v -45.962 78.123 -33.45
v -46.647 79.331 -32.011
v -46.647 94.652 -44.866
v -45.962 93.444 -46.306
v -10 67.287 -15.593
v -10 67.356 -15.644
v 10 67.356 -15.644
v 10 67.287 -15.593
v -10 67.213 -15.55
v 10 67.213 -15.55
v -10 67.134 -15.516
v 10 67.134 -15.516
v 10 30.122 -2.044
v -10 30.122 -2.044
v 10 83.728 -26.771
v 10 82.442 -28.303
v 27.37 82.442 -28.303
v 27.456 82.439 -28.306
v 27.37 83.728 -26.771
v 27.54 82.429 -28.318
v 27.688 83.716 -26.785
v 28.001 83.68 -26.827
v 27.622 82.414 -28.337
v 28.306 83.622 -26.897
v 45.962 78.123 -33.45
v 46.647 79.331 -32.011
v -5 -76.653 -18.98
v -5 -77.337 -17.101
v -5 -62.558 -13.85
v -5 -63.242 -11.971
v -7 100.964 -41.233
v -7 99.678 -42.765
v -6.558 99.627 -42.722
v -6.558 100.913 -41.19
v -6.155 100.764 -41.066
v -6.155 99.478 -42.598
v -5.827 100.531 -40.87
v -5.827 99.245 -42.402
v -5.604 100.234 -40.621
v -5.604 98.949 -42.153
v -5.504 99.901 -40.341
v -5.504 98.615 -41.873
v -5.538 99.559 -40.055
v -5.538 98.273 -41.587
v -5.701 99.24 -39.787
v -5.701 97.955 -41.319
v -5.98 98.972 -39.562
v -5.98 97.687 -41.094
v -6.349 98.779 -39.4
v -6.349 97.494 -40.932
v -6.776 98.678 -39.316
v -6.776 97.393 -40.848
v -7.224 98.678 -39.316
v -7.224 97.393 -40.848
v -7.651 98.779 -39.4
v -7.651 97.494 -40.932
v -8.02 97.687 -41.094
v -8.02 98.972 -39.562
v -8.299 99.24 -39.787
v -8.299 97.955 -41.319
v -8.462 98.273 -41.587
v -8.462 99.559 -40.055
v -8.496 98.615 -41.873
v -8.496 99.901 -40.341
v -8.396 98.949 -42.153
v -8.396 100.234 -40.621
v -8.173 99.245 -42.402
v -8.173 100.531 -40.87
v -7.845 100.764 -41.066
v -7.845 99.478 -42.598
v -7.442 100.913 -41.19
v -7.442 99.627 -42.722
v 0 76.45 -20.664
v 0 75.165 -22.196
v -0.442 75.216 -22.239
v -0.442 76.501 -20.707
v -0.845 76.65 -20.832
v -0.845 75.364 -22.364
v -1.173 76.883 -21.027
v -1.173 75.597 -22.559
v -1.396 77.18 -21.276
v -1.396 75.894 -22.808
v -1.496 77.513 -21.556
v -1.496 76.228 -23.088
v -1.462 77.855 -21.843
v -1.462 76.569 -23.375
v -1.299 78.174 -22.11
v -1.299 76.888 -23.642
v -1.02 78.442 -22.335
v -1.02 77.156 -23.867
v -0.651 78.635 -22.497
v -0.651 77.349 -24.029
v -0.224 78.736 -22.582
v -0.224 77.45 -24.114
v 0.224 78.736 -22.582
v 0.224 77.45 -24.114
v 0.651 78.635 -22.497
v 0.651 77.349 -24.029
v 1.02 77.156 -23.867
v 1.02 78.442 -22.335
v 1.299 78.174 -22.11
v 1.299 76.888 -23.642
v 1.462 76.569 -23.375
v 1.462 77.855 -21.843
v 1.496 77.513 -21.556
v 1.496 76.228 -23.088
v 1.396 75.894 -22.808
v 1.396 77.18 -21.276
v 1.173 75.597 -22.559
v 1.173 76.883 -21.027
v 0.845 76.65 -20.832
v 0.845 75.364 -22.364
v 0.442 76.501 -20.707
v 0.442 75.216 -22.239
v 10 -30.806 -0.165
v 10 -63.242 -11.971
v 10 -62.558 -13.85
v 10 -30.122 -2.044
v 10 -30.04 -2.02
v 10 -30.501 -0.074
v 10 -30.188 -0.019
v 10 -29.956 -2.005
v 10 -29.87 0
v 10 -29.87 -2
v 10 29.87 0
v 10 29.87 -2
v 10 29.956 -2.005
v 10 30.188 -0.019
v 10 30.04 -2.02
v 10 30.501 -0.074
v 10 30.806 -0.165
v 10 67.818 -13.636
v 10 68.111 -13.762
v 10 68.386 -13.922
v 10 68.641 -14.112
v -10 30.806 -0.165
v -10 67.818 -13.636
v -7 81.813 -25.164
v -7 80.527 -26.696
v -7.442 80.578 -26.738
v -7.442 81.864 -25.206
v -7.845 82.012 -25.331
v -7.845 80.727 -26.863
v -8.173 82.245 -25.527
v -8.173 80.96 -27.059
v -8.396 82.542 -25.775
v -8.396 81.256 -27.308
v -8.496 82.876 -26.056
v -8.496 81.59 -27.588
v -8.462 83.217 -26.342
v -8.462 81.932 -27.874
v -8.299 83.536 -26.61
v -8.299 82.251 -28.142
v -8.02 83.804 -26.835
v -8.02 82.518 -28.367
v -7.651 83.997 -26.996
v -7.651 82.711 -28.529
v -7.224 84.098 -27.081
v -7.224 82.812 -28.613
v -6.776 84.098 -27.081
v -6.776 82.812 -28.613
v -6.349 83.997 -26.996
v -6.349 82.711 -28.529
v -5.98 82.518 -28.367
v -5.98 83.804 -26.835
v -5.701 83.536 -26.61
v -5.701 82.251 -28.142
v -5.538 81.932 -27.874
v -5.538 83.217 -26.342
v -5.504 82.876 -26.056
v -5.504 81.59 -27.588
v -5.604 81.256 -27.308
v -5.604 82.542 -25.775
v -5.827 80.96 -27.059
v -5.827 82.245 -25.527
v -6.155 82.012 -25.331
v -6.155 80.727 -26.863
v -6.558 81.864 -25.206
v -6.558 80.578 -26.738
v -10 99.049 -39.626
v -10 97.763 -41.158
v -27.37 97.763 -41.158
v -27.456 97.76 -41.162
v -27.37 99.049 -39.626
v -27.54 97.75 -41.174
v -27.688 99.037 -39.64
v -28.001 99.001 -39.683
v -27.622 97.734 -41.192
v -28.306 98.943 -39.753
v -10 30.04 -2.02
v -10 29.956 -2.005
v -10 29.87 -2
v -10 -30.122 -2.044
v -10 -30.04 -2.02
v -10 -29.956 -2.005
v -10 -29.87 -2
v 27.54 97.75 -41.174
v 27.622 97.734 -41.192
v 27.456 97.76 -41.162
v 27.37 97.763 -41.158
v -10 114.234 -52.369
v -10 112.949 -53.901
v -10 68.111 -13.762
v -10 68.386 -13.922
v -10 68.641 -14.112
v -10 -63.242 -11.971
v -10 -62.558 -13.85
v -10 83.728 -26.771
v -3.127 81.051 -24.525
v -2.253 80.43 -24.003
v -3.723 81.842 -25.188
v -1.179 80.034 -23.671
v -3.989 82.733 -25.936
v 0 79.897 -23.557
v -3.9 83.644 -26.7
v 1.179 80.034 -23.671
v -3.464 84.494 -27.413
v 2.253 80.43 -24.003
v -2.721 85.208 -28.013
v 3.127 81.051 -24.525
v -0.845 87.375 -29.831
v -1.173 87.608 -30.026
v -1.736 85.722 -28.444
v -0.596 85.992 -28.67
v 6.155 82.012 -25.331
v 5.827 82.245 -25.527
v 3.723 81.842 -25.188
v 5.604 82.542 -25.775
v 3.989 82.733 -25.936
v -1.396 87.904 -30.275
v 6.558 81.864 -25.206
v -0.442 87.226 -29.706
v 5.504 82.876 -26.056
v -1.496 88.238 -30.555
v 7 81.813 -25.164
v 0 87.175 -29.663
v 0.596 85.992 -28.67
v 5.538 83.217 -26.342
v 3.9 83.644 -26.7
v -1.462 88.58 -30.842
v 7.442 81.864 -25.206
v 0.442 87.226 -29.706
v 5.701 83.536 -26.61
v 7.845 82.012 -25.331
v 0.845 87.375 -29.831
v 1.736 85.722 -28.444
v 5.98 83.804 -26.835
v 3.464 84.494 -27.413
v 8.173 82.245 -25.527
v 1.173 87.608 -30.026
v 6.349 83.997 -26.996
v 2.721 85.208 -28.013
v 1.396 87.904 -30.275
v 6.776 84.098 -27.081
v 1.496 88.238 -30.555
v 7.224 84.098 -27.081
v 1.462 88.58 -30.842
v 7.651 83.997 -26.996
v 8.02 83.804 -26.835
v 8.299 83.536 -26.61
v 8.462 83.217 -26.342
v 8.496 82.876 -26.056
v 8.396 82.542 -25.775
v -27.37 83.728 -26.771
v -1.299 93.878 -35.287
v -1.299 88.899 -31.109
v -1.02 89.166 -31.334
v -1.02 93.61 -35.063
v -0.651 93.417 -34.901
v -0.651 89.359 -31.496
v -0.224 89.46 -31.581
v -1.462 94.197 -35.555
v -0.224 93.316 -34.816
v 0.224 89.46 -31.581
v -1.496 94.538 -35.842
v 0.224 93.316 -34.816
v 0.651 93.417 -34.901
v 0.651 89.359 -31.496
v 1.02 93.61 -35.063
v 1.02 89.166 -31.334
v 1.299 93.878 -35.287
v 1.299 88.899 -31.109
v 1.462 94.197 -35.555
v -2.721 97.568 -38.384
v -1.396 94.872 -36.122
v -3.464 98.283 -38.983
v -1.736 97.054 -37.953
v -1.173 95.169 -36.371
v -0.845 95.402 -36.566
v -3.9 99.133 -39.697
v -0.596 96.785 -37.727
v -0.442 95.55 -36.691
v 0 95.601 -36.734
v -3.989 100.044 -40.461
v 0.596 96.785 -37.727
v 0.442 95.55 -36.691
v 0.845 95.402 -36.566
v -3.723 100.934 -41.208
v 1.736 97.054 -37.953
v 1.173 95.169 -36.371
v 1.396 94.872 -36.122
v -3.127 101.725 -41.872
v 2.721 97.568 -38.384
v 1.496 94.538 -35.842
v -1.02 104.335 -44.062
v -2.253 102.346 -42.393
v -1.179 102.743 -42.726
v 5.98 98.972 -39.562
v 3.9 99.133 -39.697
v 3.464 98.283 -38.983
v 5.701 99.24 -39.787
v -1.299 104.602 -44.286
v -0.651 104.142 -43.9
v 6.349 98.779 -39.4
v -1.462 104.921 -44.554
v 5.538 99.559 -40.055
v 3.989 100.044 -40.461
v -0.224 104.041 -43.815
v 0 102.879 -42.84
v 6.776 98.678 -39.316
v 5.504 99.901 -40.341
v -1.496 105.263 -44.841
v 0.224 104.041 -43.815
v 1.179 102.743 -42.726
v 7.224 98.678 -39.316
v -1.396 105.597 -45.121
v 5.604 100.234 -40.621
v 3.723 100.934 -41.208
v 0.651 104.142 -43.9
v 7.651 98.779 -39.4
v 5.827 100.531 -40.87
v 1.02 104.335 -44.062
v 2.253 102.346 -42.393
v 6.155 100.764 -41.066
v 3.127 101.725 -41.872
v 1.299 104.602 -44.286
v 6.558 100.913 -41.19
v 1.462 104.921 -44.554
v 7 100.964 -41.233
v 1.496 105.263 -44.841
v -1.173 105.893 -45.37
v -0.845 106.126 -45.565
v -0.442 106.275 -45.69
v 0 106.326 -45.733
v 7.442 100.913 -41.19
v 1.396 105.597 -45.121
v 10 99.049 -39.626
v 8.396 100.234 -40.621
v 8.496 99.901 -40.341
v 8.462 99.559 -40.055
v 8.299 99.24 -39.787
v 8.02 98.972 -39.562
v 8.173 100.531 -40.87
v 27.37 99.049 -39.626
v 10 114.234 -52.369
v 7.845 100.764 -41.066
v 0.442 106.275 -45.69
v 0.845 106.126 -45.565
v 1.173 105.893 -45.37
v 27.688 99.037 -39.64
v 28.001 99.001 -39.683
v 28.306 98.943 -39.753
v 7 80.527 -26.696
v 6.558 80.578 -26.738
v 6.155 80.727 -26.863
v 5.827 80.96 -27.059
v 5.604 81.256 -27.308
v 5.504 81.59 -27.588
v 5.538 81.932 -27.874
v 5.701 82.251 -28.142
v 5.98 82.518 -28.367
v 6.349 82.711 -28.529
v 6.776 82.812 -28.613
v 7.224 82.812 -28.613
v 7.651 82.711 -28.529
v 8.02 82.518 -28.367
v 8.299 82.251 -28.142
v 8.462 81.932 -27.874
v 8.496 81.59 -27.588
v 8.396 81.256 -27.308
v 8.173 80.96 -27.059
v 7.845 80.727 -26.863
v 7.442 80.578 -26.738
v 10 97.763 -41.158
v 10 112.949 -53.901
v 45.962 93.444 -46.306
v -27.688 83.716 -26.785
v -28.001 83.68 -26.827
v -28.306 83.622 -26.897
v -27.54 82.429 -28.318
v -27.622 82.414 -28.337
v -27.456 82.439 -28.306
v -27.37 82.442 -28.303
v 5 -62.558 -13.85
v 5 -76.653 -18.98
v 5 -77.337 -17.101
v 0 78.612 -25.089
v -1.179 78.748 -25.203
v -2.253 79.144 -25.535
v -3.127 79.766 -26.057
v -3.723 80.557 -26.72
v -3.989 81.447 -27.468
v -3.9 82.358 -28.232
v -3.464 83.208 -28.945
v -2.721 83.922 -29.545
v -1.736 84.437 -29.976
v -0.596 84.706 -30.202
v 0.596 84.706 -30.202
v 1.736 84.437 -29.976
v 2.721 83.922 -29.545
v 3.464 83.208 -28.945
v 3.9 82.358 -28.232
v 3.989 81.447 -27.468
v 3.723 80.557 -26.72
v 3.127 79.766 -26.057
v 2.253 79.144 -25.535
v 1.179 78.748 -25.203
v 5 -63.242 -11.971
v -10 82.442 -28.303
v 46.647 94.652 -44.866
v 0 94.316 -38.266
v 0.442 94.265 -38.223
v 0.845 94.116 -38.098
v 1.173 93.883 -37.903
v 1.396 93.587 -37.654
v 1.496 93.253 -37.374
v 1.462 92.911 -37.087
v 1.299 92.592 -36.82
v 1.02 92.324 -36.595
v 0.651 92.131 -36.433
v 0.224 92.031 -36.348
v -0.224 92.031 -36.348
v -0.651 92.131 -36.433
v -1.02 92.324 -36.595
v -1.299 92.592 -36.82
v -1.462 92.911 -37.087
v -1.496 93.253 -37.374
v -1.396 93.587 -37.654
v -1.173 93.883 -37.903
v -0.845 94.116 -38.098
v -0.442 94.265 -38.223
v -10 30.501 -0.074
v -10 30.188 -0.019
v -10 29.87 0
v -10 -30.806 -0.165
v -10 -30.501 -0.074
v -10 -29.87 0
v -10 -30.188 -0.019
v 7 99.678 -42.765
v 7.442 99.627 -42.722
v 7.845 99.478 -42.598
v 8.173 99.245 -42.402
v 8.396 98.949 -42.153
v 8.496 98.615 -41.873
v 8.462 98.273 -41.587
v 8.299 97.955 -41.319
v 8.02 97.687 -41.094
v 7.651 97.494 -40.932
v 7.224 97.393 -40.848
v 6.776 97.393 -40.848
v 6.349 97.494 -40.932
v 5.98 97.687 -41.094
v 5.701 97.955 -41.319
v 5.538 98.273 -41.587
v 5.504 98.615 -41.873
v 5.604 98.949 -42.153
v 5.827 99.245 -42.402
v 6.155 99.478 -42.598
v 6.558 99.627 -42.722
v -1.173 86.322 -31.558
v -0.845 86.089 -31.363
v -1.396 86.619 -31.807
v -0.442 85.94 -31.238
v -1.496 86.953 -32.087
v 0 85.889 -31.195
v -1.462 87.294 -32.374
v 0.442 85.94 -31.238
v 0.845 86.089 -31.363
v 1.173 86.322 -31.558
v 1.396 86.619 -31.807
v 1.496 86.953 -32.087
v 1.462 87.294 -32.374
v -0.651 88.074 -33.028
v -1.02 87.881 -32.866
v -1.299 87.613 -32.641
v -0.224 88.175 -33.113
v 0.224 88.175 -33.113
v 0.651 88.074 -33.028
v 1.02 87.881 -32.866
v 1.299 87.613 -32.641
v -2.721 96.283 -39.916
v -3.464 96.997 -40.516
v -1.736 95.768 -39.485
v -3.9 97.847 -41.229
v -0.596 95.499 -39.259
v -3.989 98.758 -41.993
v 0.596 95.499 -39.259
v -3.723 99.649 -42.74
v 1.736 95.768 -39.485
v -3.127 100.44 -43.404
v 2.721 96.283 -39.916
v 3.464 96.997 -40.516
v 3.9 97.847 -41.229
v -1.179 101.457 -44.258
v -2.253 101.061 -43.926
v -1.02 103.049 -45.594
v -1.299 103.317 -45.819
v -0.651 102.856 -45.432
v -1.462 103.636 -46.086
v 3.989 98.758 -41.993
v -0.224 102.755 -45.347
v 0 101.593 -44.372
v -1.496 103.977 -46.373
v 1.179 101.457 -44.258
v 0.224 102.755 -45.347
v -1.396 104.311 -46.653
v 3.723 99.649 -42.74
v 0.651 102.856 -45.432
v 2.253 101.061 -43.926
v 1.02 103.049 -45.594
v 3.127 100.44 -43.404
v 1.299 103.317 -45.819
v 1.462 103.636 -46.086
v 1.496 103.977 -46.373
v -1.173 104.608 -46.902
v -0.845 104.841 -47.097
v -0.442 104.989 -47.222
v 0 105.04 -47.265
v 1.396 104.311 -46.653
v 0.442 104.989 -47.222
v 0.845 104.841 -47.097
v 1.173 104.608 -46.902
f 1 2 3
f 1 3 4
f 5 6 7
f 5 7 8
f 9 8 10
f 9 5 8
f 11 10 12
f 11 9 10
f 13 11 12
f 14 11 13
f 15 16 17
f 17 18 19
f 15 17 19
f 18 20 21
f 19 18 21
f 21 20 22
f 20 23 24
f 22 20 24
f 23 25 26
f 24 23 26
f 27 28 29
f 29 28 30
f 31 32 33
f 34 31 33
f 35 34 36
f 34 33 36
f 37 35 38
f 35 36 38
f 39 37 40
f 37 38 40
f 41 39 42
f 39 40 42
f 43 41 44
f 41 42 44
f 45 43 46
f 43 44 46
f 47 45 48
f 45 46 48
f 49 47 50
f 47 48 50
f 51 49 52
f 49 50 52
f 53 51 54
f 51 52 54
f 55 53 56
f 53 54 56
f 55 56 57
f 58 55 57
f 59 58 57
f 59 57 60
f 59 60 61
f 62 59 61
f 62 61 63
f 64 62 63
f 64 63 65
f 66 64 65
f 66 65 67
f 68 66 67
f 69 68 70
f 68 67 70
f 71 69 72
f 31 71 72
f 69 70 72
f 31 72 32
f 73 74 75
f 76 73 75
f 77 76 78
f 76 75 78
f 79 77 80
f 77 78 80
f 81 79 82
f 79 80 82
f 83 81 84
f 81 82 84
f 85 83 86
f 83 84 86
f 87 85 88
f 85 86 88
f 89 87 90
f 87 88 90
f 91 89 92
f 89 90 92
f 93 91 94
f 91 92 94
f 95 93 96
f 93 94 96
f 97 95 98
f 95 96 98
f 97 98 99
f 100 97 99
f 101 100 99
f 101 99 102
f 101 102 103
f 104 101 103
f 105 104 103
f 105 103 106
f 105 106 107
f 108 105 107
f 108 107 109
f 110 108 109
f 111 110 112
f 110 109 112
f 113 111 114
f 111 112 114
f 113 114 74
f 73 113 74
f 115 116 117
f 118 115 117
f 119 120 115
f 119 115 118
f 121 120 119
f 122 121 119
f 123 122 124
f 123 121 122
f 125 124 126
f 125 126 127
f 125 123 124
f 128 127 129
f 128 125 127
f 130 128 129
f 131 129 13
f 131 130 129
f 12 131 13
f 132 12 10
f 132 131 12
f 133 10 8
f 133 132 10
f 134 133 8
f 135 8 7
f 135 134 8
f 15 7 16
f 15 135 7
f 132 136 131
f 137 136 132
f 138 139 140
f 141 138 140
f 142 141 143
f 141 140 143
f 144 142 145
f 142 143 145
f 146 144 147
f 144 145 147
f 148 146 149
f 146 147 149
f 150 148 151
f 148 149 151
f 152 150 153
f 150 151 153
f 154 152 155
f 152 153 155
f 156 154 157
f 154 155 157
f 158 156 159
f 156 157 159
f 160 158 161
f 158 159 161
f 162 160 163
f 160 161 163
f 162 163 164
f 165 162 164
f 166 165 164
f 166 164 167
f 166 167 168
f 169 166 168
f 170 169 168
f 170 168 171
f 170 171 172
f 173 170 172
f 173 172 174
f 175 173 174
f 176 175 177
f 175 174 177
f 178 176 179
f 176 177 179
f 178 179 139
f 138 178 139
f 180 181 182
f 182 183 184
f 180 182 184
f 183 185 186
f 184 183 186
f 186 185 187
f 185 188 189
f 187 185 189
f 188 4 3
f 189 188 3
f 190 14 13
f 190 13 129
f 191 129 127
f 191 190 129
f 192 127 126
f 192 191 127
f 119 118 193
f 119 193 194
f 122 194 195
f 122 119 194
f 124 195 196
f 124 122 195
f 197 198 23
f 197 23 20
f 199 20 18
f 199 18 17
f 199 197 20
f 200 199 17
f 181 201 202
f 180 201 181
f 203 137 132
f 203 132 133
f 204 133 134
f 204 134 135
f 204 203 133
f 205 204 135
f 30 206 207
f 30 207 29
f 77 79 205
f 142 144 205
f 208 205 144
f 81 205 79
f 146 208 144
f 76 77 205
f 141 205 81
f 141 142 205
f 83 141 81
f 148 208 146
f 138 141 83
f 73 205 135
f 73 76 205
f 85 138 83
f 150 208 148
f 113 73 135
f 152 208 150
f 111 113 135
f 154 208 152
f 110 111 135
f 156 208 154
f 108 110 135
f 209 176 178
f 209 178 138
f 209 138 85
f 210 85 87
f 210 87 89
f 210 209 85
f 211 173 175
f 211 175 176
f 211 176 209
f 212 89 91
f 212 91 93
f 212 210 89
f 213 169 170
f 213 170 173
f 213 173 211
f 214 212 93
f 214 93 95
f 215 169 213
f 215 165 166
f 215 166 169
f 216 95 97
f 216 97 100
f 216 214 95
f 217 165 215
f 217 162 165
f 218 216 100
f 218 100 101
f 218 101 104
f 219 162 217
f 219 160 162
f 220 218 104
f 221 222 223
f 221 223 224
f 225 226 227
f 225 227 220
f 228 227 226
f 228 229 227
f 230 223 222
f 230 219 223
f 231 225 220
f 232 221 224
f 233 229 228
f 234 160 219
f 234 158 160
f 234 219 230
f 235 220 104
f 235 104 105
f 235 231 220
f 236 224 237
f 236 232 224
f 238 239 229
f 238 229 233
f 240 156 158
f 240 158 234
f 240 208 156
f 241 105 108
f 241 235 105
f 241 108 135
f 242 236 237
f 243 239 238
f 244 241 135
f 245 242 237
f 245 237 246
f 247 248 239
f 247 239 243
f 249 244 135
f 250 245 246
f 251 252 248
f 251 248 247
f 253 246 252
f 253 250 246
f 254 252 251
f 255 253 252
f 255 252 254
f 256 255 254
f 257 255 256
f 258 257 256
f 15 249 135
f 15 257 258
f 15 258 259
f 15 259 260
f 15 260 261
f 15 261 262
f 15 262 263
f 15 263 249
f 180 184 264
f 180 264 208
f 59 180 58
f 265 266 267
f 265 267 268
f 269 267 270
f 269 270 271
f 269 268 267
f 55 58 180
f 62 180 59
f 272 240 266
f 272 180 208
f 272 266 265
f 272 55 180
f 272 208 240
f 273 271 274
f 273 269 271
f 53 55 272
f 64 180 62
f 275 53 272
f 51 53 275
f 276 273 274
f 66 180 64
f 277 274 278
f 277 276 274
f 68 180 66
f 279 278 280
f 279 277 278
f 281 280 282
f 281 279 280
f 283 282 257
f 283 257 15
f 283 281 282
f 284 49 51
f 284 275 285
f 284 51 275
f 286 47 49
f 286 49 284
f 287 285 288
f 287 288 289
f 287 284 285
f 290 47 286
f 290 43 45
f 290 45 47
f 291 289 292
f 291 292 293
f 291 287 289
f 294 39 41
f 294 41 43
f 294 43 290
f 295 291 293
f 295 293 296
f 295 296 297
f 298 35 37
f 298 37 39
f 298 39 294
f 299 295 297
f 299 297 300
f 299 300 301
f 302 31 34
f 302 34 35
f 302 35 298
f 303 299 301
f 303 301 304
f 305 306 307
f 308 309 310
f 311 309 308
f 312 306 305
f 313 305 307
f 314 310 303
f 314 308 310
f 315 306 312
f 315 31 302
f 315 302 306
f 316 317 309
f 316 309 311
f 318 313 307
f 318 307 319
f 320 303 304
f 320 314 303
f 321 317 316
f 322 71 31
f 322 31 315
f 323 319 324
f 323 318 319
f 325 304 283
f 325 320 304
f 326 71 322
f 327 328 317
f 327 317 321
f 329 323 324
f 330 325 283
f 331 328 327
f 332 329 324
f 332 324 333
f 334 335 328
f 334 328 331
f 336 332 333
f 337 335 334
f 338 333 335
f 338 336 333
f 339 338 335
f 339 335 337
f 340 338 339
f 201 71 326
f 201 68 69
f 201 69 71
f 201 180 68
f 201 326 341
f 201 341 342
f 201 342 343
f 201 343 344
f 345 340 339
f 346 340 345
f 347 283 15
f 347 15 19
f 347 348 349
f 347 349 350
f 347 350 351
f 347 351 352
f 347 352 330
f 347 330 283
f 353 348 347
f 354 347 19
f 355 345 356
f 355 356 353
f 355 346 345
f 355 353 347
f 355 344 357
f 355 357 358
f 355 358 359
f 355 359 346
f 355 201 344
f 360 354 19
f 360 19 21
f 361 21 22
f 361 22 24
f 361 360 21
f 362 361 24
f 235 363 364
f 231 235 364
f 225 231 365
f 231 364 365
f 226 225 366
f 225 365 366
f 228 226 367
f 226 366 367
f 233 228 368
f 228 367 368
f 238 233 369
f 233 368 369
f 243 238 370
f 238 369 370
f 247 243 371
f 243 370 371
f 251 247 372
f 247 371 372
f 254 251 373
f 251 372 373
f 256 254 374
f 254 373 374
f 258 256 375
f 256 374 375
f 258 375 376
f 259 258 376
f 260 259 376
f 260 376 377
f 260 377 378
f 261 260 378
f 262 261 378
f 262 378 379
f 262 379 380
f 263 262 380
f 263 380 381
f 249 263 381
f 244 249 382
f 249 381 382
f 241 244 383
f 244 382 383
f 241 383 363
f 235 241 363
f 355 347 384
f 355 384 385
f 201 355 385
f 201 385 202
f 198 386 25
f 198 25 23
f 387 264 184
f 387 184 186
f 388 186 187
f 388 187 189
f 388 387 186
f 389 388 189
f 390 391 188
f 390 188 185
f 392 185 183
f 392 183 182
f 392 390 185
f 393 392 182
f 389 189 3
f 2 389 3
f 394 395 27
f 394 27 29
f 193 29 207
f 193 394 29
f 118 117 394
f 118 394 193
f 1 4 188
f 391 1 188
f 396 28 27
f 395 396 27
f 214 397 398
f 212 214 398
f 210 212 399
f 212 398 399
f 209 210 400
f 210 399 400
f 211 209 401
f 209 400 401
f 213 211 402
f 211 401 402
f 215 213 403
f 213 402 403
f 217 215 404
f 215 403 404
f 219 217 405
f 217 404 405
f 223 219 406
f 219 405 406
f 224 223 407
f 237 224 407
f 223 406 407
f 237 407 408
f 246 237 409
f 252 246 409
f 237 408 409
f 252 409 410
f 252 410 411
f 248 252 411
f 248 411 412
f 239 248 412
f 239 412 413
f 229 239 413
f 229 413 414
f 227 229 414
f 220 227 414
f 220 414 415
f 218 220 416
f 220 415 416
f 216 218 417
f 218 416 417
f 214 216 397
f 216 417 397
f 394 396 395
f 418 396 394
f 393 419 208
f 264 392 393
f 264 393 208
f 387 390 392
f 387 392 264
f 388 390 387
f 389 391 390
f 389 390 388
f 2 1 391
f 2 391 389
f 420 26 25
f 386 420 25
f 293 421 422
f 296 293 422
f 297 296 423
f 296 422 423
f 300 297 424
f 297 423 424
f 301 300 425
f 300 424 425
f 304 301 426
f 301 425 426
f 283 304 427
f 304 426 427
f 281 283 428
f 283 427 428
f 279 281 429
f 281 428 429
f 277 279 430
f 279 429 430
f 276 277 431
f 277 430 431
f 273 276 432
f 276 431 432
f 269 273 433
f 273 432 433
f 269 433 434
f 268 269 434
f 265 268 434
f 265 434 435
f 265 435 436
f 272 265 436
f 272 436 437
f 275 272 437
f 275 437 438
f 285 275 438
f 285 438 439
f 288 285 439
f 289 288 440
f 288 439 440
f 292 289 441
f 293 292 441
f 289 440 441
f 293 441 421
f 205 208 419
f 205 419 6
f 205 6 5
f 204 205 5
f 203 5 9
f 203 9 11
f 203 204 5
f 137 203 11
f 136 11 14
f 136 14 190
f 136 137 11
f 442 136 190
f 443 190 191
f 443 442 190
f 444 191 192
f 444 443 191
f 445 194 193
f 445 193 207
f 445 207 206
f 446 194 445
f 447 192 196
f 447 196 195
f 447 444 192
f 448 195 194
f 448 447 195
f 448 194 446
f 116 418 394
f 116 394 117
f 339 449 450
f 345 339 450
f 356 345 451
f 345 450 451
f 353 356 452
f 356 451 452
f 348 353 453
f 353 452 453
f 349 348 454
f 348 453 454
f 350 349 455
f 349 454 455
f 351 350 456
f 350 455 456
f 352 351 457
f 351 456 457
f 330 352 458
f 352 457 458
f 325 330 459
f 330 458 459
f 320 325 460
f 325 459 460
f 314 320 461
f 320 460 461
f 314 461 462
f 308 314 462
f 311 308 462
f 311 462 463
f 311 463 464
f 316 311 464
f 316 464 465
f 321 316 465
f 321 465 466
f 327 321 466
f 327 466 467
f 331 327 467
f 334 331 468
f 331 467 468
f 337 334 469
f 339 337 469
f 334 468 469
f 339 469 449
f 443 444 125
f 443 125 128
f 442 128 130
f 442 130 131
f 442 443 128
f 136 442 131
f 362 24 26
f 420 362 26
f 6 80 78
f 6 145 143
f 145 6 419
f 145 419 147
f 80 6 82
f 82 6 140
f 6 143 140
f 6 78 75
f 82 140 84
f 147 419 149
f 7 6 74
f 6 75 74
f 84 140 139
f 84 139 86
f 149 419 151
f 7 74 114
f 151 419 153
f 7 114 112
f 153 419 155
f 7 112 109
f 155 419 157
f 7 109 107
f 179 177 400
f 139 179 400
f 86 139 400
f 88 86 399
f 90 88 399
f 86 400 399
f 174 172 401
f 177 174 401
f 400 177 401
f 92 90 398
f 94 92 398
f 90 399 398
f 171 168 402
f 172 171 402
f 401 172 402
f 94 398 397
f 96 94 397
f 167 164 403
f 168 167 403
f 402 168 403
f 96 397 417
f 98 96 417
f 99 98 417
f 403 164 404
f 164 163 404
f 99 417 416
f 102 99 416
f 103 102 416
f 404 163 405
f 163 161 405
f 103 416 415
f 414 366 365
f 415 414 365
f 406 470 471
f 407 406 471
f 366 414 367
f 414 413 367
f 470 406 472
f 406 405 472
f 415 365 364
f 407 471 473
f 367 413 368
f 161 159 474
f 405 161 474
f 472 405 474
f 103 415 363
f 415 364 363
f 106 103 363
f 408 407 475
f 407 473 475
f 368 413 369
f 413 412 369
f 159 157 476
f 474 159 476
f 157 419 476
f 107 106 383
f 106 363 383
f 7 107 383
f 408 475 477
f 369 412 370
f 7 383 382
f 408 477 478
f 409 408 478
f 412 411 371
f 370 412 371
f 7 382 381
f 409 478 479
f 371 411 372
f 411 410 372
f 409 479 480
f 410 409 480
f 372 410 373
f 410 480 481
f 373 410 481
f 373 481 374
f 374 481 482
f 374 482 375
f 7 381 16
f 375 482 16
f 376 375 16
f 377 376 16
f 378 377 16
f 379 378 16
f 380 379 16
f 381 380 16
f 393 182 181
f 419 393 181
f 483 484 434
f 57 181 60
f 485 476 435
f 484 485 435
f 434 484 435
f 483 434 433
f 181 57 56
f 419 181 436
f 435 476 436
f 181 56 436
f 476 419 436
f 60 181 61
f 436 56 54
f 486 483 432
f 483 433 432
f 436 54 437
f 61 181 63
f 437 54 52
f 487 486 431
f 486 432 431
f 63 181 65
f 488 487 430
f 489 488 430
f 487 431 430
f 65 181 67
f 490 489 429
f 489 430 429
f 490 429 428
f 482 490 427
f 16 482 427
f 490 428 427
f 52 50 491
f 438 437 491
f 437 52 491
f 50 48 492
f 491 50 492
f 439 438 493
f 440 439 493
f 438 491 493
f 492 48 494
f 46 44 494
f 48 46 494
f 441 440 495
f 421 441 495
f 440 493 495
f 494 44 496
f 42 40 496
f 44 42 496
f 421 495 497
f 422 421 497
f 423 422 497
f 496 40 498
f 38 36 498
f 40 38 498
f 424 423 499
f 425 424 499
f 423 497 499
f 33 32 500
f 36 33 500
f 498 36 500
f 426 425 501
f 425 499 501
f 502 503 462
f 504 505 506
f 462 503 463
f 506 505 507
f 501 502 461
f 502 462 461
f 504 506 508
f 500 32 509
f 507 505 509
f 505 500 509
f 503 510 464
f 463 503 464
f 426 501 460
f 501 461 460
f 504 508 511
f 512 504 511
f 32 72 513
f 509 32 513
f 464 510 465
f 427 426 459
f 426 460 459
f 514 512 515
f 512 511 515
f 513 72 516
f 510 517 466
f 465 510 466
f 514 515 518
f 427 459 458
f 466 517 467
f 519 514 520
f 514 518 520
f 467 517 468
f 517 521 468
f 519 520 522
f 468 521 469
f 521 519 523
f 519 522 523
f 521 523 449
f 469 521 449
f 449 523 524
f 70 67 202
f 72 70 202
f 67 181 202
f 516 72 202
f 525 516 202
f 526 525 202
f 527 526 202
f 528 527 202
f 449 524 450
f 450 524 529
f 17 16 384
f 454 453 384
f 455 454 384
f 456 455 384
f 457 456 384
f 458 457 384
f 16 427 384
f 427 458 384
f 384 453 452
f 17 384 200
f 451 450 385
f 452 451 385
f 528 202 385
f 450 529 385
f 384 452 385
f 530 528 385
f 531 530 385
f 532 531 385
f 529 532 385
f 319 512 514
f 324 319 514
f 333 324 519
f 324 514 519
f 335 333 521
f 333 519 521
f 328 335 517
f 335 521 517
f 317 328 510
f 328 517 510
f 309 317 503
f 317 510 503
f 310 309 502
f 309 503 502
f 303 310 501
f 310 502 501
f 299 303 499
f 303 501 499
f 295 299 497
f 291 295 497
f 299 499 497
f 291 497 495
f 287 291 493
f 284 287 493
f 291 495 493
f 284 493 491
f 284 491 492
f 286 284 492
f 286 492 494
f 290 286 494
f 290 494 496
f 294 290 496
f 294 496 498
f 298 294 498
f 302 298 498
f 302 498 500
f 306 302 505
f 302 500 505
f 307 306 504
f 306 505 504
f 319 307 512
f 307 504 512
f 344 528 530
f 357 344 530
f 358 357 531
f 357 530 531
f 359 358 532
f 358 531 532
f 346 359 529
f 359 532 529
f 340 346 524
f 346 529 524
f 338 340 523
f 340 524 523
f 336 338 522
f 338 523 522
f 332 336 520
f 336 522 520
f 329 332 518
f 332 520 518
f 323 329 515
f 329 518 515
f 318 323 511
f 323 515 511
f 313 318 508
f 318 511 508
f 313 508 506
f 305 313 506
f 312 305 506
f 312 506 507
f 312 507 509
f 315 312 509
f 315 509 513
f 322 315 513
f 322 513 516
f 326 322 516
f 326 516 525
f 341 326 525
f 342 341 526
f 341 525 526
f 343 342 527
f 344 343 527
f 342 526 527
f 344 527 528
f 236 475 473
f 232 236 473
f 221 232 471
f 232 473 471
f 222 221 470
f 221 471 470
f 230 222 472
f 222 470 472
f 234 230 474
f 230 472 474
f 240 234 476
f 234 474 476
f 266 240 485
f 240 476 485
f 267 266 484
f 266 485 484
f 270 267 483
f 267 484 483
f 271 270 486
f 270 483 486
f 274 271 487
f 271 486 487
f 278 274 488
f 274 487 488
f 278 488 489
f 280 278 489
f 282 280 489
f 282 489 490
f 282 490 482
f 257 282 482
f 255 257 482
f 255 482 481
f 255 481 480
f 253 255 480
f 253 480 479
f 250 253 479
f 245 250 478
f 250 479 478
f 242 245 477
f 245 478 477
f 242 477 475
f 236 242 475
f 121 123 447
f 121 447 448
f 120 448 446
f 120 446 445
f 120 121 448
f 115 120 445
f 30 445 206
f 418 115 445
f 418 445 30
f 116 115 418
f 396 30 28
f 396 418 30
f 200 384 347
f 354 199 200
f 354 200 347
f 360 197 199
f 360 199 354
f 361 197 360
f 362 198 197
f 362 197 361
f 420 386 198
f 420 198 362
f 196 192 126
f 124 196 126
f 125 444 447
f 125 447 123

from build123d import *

# Parameters (mm, degrees)
SKETCH1_W                      = 20
SKETCH1_H                      = 60
BASE_FLANGE1_DEPTH             = 2
EDGE_FLANGE1_STRIP_CUT_DEPTH   = 20
EDGE_FLANGE1_DEPTH             = 20
EDGE_FLANGE2_STRIP_CUT_DEPTH   = 20
EDGE_FLANGE2_DEPTH             = 20
EDGE_FLANGE3_STRIP_CUT_DEPTH   = 20
EDGE_FLANGE3_DEPTH             = 20
EDGE_FLANGE3_START             = 2
EDGE_FLANGE3_FLAT_DEPTH        = 2
EDGE_FLANGE4_STRIP_CUT_DEPTH   = 20
EDGE_FLANGE4_STRIP_CUT_2_DEPTH = 20
EDGE_FLANGE4_DEPTH             = 20
EDGE_FLANGE4_BEND_DEPTH        = 20
SKETCH16_W                     = 5
SKETCH16_H                     = 15
CUT_EXTRUDE2_DEPTH             = 142.77897769
SKETCH23_R                     = 4
SKETCH23_R_2                   = 1.5
CUT_EXTRUDE3_DEPTH             = 2


# Sheet-metal steps are written as plain solids
with BuildPart() as part:
    # Sketch1 → Base-Flange1 (new body)
    with BuildSketch(Plane.XY):
        Rectangle(SKETCH1_W, SKETCH1_H)
    extrude(amount=-BASE_FLANGE1_DEPTH)

    # Edge-Flange1 strip (across the edge) → Edge-Flange1 strip cut (cut)
    with BuildSketch(Plane(origin=(-10, 30, -2), x_dir=(0, -0.3420201433256631, -0.9396926207859105), z_dir=(1, 0, 0))):
        Polygon((-5.074988048, 8.095806265), (-1.834962826, -0.80608987), (0.044422416, -0.122049584), (-3.195602806, 8.779846552), align=None)
    extrude(amount=EDGE_FLANGE1_STRIP_CUT_DEPTH, mode=Mode.SUBTRACT)

    # Edge-Flange1 section (across the edge) → Edge-Flange1 (add)
    with BuildSketch(Plane(origin=(-10, 30, -2), x_dir=(0, -0.3420201433256631, -0.9396926207859105), z_dir=(1, 0, 0))):
        with BuildLine():
            Line((-2, 0.129882454), (-2, 39.647346039))
            Line((-2, 39.647346039), (0, 39.647346039))
            Line((0, 39.647346039), (0, 0.129882454))
            ThreePointArc((0, 0.129882454), (0.011190609, 0.001973206), (0.044422416, -0.122049584))
            Line((0.044422416, -0.122049584), (-1.834962826, -0.80608987))
            ThreePointArc((-1.834962826, -0.80608987), (-1.958424897, -0.345323149), (-2, 0.129882454))
        make_face()
    extrude(amount=EDGE_FLANGE1_DEPTH)

    # Edge-Flange2 strip (across the edge) → Edge-Flange2 strip cut (cut)
    with BuildSketch(Plane(origin=(10, -30, -2), x_dir=(0, 0.34202014332566344, -0.9396926207859103), z_dir=(-1, 0, 0))):
        Polygon((-5.074988048, 8.095806265), (-1.834962826, -0.80608987), (0.044422416, -0.122049584), (-3.195602806, 8.779846552), align=None)
    extrude(amount=EDGE_FLANGE2_STRIP_CUT_DEPTH, mode=Mode.SUBTRACT)

    # Edge-Flange2 section (across the edge) → Edge-Flange2 (add)
    with BuildSketch(Plane(origin=(10, -30, -2), x_dir=(0, 0.34202014332566344, -0.9396926207859103), z_dir=(-1, 0, 0))):
        with BuildLine():
            Line((-2, 0.129882454), (-2, 49.647346039))
            Line((-2, 49.647346039), (0, 49.647346039))
            Line((0, 49.647346039), (0, 0.129882454))
            ThreePointArc((0, 0.129882454), (0.011190609, 0.001973206), (0.044422416, -0.122049584))
            Line((0.044422416, -0.122049584), (-1.834962826, -0.80608987))
            ThreePointArc((-1.834962826, -0.80608987), (-1.958424897, -0.345323149), (-2, 0.129882454))
        make_face()
    extrude(amount=EDGE_FLANGE2_DEPTH)

    # Edge-Flange3 strip (across the edge) → Edge-Flange3 strip cut (cut)
    with BuildSketch(Plane(origin=(-10, 67.256318506, -15.560190975), x_dir=(0, -0.6427876096865303, -0.7660444431189858), z_dir=(1, 0, 0))):
        Polygon((-5.074988048, 8.095806265), (-1.834962826, -0.80608987), (0.044422416, -0.122049584), (-3.195602806, 8.779846552), align=None)
    extrude(amount=EDGE_FLANGE3_STRIP_CUT_DEPTH, mode=Mode.SUBTRACT)

    # Edge-Flange3 bend section (across the edge) → Edge-Flange3 (add)
    with BuildSketch(Plane(origin=(-10, 67.256318506, -15.560190975), x_dir=(0, -0.6427876096865303, -0.7660444431189858), z_dir=(1, 0, 0))):
        with BuildLine():
            Line((-2, 0.129882454), (0, 0.129882454))
            ThreePointArc((0, 0.129882454), (0.011190609, 0.001973206), (0.044422416, -0.122049584))
            Line((0.044422416, -0.122049584), (-1.834962826, -0.80608987))
            ThreePointArc((-1.834962826, -0.80608987), (-1.958424897, -0.345323149), (-2, 0.129882454))
        make_face()
    extrude(amount=EDGE_FLANGE3_DEPTH)

    # Edge-Flange3 profile (on flange) → Edge-Flange3 flat (add)
    with BuildSketch(Plane(origin=(0, 67.256318506, -15.560190975), x_dir=(1, 0, 0), z_dir=(0, 0.6427876096865303, 0.7660444431189858)).offset(EDGE_FLANGE3_START)):
        Polygon((10, 0.129882454), (10, 19.823673019), (27.5, 19.823673019), (27.5, 39.823673019), (10, 39.823673019), (10, 59.647346039), (-10, 59.647346039), (-10, 39.823673019), (-27.5, 39.823673019), (-27.5, 19.823673019), (-10, 19.823673019), (-10, 0.129882454), align=None)
    extrude(amount=-EDGE_FLANGE3_FLAT_DEPTH)

    # Edge-Flange4 strip (across the edge) → Edge-Flange4 strip cut (cut)
    with BuildSketch(Plane(origin=(27.5, 97.763021927, -41.158354564), x_dir=(-0.34202014332566383, -0.6040227735550463, -0.7198463103929629), z_dir=(0, -0.7660444431189858, 0.6427876096865304))):
        Polygon((-5.074988048, 8.095806265), (-1.834962826, -0.80608987), (0.044422416, -0.122049584), (-3.195602806, 8.779846552), align=None)
    extrude(amount=EDGE_FLANGE4_STRIP_CUT_DEPTH, mode=Mode.SUBTRACT)

    # Edge-Flange4 strip 2 (across the edge) → Edge-Flange4 strip cut 2 (cut)
    with BuildSketch(Plane(origin=(-27.5, 82.442133065, -28.30260237), x_dir=(0.3420201433256639, -0.6040227735550463, -0.7198463103929628), z_dir=(0, 0.7660444431189859, -0.6427876096865303))):
        Polygon((-5.074988048, 8.095806265), (-1.834962826, -0.80608987), (0.044422416, -0.122049584), (-3.195602806, 8.779846552), align=None)
    extrude(amount=EDGE_FLANGE4_STRIP_CUT_2_DEPTH, mode=Mode.SUBTRACT)

    # Edge-Flange4 section (across the edge) → Edge-Flange4 (add)
    with BuildSketch(Plane(origin=(27.5, 97.763021927, -41.158354564), x_dir=(-0.34202014332566383, -0.6040227735550463, -0.7198463103929629), z_dir=(0, -0.7660444431189858, 0.6427876096865304))):
        with BuildLine():
            Line((-2, 0.129882454), (-2, 19.647346039))
            Line((-2, 19.647346039), (0, 19.647346039))
            Line((0, 19.647346039), (0, 0.129882454))
            ThreePointArc((0, 0.129882454), (0.011190609, 0.001973206), (0.044422416, -0.122049584))
            Line((0.044422416, -0.122049584), (-1.834962826, -0.80608987))
            ThreePointArc((-1.834962826, -0.80608987), (-1.958424897, -0.345323149), (-2, 0.129882454))
        make_face()
    extrude(amount=EDGE_FLANGE4_DEPTH)

    # Edge-Flange4 section 2 (across the edge) → Edge-Flange4 bend (add)
    with BuildSketch(Plane(origin=(-27.5, 82.442133065, -28.30260237), x_dir=(0.3420201433256639, -0.6040227735550463, -0.7198463103929628), z_dir=(0, 0.7660444431189859, -0.6427876096865303))):
        with BuildLine():
            Line((-2, 0.129882454), (-2, 19.647346039))
            Line((-2, 19.647346039), (0, 19.647346039))
            Line((0, 19.647346039), (0, 0.129882454))
            ThreePointArc((0, 0.129882454), (0.011190609, 0.001973206), (0.044422416, -0.122049584))
            Line((0.044422416, -0.122049584), (-1.834962826, -0.80608987))
            ThreePointArc((-1.834962826, -0.80608987), (-1.958424897, -0.345323149), (-2, 0.129882454))
        make_face()
    extrude(amount=EDGE_FLANGE4_BEND_DEPTH)

    # Sketch16 → Cut-Extrude2 (cut, through all)
    with BuildSketch(Plane(origin=(0, -3.55058603, 9.755154944), x_dir=(1, 0, 0), z_dir=(0, -0.3420201433256634, 0.9396926207859103))):
        with Locations((-7.5, -71.022164949)):
            Rectangle(SKETCH16_W, SKETCH16_H)
        with Locations((7.5, -71.022164949)):
            Rectangle(SKETCH16_W, SKETCH16_H)
    extrude(amount=-CUT_EXTRUDE2_DEPTH, mode=Mode.SUBTRACT)

    # Sketch23 → Cut-Extrude3 (cut)
    with BuildSketch(Plane(origin=(0, 20.126792325, 23.986177061), x_dir=(-1, 0, 0), z_dir=(0, -0.6427876096865301, -0.7660444431189858))):
        with Locations(Location((0, 102.346900038, 0), (0, 0, 90))):
            Circle(SKETCH23_R)
        with Locations(Location((0, 109.346900038, 0), (0, 0, 90))):
            Circle(SKETCH23_R_2)
        with Locations(Location((7, 102.346900038, 0), (0, 0, 90))):
            Circle(SKETCH23_R_2)
        with Locations(Location((0, 95.346900038, 0), (0, 0, 90))):
            Circle(SKETCH23_R_2)
        with Locations(Location((-7, 102.346900038, 0), (0, 0, 90))):
            Circle(SKETCH23_R_2)
        with Locations(Location((-7, 80.346900038, 0), (0, 0, 270))):
            Circle(SKETCH23_R_2)
        with Locations(Location((7, 80.346900038, 0), (0, 0, 270))):
            Circle(SKETCH23_R_2)
        with Locations(Location((0, 80.346900038, 0), (0, 0, 270))):
            Circle(SKETCH23_R)
        with Locations(Location((0, 87.346900038, 0), (0, 0, 270))):
            Circle(SKETCH23_R_2)
        with Locations(Location((0, 73.346900038, 0), (0, 0, 270))):
            Circle(SKETCH23_R_2)
    extrude(amount=-CUT_EXTRUDE3_DEPTH, mode=Mode.SUBTRACT)


solid = part.part
